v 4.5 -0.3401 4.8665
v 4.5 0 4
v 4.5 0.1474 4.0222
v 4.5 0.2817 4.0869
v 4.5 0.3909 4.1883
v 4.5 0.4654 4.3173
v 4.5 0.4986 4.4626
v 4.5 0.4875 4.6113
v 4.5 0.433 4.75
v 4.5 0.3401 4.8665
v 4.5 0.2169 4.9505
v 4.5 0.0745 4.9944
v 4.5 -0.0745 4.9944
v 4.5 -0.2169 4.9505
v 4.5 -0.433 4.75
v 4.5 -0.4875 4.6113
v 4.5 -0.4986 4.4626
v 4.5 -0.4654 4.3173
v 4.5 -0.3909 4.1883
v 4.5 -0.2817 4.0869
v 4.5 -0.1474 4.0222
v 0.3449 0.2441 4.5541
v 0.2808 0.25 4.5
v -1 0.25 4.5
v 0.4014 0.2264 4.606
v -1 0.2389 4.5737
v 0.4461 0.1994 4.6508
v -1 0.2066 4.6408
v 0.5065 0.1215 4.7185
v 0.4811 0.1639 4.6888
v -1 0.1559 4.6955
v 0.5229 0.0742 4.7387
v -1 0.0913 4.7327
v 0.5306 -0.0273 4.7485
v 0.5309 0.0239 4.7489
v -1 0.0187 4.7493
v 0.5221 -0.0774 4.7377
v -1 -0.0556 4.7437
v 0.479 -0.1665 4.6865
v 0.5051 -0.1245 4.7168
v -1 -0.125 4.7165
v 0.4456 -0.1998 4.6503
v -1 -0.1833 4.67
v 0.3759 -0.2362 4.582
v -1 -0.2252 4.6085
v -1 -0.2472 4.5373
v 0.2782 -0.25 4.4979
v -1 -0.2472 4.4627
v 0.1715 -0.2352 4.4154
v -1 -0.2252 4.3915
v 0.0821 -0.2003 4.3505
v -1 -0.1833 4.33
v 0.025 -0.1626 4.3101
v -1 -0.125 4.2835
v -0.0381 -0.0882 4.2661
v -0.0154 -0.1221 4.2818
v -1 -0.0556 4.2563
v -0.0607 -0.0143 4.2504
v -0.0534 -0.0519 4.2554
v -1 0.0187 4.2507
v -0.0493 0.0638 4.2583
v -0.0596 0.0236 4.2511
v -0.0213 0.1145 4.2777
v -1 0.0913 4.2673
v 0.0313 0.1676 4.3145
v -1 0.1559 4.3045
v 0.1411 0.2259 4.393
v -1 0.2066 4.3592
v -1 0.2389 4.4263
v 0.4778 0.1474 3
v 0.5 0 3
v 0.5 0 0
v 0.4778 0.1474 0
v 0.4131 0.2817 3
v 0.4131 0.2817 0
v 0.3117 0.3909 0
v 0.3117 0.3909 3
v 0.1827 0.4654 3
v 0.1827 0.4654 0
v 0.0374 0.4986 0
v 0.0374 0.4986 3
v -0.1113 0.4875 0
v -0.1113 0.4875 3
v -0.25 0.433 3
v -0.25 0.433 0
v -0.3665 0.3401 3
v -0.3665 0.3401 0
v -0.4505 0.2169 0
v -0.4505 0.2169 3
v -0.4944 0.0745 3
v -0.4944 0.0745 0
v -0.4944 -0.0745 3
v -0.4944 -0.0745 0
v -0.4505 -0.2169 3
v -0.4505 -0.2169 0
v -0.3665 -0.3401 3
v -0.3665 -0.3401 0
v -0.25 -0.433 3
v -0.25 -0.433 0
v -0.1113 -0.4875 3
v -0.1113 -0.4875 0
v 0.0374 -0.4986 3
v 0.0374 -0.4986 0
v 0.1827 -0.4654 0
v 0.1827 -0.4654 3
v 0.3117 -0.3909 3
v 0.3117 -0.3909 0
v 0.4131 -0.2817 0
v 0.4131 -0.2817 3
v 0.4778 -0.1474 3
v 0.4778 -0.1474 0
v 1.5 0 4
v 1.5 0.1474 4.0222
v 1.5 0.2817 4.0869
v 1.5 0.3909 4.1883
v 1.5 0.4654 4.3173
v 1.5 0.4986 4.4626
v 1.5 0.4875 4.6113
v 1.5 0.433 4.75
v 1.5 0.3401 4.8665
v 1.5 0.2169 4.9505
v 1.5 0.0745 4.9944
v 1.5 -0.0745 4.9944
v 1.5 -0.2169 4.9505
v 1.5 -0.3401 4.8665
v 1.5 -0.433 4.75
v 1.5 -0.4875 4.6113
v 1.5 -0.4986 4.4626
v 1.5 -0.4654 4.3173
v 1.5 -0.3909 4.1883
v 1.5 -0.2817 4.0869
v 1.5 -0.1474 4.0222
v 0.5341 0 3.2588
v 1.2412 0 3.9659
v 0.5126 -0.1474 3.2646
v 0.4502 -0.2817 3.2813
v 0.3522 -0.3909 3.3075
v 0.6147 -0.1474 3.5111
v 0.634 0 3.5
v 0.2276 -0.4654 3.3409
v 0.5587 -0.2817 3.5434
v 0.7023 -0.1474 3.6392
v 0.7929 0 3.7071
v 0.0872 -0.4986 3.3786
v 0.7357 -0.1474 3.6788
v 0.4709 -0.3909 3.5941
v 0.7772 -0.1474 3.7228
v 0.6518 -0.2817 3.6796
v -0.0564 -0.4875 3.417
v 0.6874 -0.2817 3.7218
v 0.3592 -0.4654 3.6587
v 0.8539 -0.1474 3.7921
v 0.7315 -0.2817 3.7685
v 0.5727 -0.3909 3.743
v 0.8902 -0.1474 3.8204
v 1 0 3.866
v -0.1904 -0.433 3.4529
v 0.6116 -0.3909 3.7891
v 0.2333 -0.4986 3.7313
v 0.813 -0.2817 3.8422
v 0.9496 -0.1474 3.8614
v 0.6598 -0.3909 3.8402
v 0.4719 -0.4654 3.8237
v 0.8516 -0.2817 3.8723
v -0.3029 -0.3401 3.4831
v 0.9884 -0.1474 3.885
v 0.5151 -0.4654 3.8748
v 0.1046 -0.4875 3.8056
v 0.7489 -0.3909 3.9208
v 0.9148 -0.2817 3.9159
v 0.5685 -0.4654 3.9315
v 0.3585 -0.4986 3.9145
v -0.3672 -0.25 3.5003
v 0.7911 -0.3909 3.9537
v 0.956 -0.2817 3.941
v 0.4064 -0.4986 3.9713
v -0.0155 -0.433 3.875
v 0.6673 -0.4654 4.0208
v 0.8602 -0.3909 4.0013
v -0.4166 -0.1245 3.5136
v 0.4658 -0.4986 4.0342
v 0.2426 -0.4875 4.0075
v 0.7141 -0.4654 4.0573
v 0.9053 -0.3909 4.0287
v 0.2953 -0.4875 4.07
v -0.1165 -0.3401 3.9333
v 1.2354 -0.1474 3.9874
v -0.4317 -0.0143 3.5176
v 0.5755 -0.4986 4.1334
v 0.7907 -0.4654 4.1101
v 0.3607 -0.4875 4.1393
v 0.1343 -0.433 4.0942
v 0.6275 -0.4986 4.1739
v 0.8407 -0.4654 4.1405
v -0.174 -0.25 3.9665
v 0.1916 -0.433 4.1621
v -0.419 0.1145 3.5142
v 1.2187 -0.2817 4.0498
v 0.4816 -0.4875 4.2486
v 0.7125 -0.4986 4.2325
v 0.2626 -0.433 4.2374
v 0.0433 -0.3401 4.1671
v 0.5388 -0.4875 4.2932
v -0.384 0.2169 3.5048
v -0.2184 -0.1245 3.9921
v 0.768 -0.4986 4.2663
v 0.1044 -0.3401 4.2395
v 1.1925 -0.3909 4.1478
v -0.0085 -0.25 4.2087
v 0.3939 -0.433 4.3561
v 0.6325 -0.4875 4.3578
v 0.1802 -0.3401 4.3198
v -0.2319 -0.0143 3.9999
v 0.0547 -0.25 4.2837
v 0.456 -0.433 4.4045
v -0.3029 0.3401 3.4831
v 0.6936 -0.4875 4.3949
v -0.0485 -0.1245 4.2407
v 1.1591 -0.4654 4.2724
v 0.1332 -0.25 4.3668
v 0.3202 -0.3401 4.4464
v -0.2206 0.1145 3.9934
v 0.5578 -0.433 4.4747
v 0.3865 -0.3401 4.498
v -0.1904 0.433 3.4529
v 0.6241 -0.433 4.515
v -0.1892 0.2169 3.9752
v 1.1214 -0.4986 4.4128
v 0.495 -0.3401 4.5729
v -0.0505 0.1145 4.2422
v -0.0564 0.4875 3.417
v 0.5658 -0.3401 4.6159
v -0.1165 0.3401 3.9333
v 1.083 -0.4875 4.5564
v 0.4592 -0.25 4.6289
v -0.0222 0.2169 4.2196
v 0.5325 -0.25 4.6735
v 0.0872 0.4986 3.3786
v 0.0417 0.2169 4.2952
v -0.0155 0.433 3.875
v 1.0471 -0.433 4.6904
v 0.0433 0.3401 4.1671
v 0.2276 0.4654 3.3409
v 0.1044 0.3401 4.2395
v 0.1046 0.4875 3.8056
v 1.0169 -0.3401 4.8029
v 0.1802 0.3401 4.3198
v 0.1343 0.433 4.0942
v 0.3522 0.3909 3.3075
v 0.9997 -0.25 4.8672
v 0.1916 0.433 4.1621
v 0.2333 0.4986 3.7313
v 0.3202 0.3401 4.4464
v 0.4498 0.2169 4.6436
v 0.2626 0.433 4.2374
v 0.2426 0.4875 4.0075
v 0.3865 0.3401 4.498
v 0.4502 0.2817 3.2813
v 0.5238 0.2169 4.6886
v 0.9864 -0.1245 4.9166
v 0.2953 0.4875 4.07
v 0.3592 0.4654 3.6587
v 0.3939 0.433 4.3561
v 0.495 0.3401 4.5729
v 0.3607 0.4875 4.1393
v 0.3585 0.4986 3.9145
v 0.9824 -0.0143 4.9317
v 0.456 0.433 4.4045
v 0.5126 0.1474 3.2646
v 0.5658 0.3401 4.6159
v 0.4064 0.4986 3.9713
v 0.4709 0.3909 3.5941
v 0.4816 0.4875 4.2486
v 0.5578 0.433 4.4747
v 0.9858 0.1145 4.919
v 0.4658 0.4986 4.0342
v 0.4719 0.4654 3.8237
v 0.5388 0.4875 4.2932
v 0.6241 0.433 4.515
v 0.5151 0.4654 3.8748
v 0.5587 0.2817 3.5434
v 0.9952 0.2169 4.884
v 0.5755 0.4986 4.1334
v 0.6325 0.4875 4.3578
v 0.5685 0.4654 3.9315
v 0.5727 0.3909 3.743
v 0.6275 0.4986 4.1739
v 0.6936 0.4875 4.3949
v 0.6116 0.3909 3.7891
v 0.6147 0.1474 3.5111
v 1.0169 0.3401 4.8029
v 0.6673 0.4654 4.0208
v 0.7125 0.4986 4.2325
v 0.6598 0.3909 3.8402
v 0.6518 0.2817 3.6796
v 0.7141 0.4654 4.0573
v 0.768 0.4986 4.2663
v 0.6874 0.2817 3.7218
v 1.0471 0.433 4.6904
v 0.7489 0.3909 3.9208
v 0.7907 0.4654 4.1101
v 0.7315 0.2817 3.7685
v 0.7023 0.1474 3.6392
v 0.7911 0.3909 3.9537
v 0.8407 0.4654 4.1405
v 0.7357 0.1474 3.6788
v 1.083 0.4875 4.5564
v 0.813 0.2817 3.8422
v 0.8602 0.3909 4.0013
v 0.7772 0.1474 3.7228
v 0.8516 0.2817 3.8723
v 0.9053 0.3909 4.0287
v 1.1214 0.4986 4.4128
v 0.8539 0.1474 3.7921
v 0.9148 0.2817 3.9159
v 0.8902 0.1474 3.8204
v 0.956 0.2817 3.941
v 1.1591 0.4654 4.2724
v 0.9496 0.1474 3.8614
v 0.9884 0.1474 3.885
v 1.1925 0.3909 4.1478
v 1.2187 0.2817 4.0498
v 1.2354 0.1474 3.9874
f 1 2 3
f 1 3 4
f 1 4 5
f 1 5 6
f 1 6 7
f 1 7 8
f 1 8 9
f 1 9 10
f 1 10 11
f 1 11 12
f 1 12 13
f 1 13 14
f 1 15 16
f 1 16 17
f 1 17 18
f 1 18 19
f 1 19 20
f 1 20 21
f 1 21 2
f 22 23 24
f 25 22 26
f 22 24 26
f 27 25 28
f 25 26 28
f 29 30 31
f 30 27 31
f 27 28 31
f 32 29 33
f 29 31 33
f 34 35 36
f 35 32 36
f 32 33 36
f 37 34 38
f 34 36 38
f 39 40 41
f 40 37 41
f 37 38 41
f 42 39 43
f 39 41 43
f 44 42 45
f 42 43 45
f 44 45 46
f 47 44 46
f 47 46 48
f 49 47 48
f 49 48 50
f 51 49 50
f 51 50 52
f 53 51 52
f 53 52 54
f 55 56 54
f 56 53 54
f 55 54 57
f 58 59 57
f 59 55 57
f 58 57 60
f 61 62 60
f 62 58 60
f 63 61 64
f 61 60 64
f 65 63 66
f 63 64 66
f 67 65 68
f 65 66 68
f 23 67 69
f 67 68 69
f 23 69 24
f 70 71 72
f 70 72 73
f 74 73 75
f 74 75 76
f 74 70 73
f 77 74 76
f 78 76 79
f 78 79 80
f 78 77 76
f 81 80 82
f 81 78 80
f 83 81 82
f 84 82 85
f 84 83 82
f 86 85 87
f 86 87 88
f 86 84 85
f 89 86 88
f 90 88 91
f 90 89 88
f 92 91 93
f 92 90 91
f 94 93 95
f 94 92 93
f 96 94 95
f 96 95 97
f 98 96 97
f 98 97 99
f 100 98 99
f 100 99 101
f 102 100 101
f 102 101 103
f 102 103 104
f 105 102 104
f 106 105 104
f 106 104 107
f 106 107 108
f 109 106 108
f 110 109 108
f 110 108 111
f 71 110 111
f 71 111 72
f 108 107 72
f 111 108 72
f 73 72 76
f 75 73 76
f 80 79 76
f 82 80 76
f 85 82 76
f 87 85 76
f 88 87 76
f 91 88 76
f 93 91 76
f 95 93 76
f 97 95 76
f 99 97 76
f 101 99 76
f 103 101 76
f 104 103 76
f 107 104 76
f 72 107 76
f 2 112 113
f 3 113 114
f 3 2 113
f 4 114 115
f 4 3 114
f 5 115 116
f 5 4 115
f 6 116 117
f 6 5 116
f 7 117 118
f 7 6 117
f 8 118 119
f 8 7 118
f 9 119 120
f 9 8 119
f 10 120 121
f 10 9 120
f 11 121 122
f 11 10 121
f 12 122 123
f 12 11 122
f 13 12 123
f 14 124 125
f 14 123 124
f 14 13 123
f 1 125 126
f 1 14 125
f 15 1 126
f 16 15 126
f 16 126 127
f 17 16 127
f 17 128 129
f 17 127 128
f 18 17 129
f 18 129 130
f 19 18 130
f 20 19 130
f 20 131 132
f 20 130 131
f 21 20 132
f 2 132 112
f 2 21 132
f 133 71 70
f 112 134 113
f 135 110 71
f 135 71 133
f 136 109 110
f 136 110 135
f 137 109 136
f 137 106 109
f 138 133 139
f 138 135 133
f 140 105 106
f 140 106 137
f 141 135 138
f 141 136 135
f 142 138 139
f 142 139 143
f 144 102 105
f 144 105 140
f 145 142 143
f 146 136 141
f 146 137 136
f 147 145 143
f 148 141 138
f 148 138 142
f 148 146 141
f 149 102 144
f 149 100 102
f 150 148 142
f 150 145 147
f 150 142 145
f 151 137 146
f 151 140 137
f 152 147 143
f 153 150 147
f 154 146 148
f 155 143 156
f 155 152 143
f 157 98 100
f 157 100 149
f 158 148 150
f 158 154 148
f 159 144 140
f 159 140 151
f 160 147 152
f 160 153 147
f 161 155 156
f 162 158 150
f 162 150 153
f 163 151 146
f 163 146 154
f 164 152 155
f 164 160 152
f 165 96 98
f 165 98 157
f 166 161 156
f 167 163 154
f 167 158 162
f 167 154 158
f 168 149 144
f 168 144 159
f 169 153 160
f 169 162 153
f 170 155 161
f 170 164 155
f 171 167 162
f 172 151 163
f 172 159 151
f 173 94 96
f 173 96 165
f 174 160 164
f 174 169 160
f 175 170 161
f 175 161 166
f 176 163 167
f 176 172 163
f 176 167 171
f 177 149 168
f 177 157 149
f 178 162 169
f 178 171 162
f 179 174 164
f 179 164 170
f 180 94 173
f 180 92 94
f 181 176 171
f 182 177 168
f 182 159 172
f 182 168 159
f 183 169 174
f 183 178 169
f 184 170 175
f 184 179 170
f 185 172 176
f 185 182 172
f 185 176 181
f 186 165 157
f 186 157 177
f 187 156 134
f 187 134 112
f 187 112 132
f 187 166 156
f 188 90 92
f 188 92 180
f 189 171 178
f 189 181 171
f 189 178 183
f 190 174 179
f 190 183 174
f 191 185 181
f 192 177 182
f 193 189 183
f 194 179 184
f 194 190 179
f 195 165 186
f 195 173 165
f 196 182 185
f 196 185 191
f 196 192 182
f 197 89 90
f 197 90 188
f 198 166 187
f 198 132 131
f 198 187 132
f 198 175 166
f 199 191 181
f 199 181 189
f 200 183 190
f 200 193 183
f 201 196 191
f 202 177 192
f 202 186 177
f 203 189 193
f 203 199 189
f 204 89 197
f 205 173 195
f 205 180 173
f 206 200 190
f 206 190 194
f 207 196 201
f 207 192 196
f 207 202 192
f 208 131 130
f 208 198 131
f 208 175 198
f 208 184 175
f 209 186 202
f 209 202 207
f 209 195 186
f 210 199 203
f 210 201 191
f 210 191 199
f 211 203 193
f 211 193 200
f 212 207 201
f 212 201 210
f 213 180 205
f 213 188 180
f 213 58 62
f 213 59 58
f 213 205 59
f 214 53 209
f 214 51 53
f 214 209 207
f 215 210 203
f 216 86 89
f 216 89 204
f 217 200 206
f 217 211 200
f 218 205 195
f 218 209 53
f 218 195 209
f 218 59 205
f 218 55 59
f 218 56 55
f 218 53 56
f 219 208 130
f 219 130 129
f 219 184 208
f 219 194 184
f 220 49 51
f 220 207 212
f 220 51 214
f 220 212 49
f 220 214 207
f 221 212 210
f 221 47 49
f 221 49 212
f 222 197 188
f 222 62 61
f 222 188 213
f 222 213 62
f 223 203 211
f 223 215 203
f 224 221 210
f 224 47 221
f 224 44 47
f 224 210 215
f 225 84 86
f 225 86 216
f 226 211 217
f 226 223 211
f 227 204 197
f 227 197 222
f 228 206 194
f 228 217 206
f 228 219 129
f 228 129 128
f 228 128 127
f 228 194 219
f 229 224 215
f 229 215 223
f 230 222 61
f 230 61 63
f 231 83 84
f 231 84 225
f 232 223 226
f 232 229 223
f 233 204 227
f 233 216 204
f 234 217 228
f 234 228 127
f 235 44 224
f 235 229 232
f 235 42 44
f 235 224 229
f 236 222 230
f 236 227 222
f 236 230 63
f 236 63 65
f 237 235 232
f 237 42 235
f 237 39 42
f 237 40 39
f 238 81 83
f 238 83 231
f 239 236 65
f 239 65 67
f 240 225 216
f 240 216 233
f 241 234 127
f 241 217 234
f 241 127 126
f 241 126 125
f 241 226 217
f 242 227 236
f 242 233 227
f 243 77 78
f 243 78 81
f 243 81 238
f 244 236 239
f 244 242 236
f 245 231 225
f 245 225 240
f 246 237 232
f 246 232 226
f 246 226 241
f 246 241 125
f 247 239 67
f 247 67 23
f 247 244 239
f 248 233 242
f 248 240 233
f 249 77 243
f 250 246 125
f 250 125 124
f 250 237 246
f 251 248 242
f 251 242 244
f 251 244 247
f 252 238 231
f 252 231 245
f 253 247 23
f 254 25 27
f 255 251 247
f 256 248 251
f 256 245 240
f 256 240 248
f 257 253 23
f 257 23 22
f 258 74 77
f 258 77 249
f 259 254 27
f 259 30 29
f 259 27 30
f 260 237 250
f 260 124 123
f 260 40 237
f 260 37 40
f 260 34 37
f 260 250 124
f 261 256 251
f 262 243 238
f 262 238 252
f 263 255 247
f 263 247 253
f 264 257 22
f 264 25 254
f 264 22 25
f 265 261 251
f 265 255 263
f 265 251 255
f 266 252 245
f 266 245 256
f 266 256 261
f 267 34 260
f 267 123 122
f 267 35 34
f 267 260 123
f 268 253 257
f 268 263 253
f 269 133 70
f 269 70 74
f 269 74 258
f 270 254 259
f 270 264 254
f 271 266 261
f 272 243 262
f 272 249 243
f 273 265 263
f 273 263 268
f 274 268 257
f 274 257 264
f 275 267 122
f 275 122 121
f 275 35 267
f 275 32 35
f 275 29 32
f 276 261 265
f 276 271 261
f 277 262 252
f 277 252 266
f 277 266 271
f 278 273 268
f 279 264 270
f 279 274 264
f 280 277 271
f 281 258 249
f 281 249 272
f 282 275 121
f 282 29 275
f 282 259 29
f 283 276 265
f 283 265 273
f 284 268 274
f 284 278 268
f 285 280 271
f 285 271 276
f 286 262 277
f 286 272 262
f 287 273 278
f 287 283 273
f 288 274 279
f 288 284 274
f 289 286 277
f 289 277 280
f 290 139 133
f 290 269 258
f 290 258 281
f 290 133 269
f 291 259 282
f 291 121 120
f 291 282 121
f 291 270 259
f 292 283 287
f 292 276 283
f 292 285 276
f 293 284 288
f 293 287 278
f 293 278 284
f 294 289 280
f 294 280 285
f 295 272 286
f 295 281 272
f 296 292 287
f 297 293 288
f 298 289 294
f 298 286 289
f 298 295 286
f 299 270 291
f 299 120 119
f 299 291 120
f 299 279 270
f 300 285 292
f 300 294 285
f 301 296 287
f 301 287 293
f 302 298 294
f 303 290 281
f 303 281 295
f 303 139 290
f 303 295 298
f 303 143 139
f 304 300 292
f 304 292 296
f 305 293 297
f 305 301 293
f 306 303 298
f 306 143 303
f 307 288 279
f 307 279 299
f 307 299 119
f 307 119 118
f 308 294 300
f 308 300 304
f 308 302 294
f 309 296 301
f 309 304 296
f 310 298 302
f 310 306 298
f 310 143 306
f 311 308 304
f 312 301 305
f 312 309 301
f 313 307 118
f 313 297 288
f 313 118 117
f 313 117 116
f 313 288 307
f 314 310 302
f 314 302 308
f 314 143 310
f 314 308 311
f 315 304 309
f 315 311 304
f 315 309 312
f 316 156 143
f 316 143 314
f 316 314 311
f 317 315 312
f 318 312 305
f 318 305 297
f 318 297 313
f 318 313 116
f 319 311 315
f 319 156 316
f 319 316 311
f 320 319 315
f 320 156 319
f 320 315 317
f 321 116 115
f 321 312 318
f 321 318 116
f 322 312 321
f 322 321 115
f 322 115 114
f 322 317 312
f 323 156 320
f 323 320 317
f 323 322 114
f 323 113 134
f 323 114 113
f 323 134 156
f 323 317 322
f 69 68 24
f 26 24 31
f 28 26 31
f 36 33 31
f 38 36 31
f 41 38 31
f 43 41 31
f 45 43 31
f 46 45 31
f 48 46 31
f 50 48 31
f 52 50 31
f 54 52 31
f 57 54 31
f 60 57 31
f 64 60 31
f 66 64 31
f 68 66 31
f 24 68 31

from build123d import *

# Parameters (mm, degrees)
F1_R     = 0.5
F4_R     = 0.25
F5_DEPTH = 3


with BuildPart() as f2:
    # F2: sweep along a path in F0
    with BuildLine(Plane.XZ) as f2_path:
        Line((0, 0), (0, 3))
        ThreePointArc((0, 3), (0.4393398282, 4.0606601718), (1.5, 4.5))
        Line((1.5, 4.5), (4.5, 4.5))
    # F1 (on Top) → F2 (sweep)
    with BuildSketch(Plane.XY):
        Circle(F1_R)
    sweep(path=f2_path.line)

    # F4 (on offset) → F5 (join)
    with BuildSketch(Plane.YZ.offset(-1)):
        with Locations((0, 4.5)):
            Circle(F4_R)
    extrude(amount=F5_DEPTH)


solid = f2.part
